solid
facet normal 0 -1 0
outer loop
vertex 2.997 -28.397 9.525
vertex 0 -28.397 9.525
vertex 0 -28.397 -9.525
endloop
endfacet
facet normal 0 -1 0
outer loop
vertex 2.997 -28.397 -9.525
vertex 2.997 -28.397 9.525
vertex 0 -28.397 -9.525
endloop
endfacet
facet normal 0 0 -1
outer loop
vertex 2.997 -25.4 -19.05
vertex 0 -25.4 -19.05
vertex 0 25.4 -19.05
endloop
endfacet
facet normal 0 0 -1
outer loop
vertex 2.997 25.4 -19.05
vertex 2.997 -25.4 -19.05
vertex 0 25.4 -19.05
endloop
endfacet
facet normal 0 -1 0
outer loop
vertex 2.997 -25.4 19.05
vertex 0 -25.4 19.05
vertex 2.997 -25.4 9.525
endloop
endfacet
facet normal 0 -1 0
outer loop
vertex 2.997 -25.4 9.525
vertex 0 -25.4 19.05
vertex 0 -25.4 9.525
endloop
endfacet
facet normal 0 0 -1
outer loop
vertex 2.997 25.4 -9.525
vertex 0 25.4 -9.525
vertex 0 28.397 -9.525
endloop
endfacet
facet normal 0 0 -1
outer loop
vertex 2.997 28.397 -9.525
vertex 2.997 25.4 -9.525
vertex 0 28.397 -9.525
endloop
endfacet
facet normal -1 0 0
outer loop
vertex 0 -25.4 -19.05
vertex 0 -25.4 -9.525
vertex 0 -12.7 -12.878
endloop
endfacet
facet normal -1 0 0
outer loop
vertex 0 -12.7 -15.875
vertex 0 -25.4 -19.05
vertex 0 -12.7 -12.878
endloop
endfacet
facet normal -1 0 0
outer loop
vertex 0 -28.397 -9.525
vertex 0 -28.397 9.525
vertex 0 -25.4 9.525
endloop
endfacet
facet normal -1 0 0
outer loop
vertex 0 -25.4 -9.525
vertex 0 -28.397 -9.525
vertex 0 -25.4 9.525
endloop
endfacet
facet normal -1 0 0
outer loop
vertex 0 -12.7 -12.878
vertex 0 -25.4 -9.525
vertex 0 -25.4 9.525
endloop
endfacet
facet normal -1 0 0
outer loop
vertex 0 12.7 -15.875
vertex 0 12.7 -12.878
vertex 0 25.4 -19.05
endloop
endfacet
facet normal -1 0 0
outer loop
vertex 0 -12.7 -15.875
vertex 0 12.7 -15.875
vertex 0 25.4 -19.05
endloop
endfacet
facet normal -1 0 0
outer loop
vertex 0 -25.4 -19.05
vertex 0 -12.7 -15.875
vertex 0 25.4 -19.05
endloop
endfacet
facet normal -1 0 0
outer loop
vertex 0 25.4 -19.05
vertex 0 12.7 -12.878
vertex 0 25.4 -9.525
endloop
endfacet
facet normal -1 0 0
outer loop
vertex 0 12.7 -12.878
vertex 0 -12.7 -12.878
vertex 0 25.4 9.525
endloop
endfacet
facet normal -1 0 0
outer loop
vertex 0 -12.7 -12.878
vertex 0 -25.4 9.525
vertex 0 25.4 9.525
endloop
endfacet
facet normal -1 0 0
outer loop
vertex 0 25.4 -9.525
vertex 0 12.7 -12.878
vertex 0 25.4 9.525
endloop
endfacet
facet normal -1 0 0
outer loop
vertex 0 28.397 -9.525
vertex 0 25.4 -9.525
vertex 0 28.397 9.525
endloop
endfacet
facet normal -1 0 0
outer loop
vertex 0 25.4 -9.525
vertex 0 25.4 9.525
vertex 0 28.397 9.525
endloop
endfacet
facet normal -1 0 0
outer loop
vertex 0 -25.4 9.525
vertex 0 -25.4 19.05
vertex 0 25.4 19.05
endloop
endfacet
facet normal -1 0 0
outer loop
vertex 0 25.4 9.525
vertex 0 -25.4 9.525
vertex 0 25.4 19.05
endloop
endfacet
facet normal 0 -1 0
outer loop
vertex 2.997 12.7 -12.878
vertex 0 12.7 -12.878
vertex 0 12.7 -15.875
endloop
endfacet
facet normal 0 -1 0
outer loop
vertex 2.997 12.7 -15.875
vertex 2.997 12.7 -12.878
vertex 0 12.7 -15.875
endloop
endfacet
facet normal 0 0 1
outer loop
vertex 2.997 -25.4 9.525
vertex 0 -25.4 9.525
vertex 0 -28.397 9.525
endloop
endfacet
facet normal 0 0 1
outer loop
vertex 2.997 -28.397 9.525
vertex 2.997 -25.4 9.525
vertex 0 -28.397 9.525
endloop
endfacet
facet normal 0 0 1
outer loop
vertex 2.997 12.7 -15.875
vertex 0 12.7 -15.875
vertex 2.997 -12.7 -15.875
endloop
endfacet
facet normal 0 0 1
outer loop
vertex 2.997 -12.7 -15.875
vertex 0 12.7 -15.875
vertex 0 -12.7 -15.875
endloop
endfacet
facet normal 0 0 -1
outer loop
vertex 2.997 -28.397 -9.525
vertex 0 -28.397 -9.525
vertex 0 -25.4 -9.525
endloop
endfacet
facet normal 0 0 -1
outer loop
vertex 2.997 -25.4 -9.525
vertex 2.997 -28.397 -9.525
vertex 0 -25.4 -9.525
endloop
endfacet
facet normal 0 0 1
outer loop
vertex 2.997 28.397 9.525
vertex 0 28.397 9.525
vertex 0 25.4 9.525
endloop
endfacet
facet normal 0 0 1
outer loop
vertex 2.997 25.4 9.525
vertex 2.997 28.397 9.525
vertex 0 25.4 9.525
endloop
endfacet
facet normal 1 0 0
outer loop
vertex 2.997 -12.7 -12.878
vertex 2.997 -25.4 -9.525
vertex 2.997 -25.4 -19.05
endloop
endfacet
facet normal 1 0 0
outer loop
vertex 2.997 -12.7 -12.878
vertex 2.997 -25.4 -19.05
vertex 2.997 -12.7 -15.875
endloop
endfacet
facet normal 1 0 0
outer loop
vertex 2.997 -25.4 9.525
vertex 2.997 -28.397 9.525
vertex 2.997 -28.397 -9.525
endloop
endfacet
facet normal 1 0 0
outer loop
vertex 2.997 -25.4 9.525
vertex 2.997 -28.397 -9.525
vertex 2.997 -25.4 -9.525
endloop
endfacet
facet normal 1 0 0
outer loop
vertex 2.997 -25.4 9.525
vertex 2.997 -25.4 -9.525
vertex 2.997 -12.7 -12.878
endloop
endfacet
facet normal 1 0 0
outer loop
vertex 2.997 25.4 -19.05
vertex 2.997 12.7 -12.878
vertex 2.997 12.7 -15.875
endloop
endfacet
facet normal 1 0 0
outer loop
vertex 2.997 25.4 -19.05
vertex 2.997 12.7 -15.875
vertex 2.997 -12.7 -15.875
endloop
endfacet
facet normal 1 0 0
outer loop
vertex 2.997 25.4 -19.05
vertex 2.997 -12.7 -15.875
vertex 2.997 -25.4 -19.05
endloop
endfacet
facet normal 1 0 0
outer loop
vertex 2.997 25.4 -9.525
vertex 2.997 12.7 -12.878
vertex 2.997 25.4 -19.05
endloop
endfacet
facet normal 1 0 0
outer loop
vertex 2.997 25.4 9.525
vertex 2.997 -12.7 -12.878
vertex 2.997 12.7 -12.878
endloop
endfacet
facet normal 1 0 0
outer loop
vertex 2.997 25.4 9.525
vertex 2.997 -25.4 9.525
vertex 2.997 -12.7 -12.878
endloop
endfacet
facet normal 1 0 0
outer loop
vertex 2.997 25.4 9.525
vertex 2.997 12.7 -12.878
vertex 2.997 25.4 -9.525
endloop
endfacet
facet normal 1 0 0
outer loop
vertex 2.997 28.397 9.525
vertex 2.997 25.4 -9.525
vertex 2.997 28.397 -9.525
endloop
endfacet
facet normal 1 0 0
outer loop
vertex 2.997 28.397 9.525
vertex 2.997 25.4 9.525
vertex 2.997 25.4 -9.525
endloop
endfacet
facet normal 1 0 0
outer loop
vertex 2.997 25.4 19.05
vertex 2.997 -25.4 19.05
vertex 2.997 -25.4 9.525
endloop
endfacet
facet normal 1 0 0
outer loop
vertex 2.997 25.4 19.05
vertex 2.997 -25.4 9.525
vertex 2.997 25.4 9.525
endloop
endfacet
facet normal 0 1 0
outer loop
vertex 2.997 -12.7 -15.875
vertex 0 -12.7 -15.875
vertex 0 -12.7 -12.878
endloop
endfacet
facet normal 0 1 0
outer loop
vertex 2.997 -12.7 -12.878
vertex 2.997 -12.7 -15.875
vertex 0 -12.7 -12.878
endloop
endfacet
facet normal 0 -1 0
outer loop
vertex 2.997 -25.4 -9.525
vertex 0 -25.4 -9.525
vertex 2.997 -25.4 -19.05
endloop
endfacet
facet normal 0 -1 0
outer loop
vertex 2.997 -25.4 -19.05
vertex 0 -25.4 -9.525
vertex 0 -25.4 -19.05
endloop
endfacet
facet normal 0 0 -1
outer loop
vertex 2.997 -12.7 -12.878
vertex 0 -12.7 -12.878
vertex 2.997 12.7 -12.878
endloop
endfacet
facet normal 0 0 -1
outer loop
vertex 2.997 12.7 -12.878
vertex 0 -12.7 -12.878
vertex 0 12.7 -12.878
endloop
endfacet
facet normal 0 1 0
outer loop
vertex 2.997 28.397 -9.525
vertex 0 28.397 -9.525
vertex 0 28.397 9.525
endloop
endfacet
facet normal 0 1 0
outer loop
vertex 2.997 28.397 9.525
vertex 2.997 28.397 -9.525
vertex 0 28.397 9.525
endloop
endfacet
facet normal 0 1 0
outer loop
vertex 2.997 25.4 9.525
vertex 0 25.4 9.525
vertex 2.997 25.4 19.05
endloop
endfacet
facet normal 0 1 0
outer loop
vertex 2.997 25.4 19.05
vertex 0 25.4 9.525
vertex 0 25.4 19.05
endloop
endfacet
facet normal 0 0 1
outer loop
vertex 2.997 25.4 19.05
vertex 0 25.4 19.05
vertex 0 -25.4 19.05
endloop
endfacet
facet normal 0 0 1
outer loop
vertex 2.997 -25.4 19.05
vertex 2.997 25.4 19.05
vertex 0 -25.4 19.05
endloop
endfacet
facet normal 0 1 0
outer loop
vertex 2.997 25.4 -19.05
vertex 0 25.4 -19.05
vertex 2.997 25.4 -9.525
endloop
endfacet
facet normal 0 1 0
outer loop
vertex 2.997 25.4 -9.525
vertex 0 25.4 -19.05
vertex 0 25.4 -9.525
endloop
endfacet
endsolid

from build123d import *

# Parameters (mm, degrees)
F1_DEPTH = 2.9972


with BuildPart() as f1:
    # F0 (on Right) → F1 (new body)
    with BuildSketch(Plane.YZ):
        Polygon((-25.4, 9.525), (-28.3972, 9.525), (-28.3972, -9.525), (-25.4, -9.525), (-25.4, -19.05), (0, -19.05), (25.4, -19.05), (25.4, -9.525), (28.3972, -9.525), (28.3972, 9.525), (25.4, 9.525), (25.4, 19.05), (0, 19.05), (-25.4, 19.05), align=None)
        Polygon((-12.7, -12.8778), (0, -12.8778), (12.7, -12.8778), (12.7, -15.875), (0, -15.875), (-12.7, -15.875), align=None, mode=Mode.SUBTRACT)
    extrude(amount=F1_DEPTH)


solid = f1.part
